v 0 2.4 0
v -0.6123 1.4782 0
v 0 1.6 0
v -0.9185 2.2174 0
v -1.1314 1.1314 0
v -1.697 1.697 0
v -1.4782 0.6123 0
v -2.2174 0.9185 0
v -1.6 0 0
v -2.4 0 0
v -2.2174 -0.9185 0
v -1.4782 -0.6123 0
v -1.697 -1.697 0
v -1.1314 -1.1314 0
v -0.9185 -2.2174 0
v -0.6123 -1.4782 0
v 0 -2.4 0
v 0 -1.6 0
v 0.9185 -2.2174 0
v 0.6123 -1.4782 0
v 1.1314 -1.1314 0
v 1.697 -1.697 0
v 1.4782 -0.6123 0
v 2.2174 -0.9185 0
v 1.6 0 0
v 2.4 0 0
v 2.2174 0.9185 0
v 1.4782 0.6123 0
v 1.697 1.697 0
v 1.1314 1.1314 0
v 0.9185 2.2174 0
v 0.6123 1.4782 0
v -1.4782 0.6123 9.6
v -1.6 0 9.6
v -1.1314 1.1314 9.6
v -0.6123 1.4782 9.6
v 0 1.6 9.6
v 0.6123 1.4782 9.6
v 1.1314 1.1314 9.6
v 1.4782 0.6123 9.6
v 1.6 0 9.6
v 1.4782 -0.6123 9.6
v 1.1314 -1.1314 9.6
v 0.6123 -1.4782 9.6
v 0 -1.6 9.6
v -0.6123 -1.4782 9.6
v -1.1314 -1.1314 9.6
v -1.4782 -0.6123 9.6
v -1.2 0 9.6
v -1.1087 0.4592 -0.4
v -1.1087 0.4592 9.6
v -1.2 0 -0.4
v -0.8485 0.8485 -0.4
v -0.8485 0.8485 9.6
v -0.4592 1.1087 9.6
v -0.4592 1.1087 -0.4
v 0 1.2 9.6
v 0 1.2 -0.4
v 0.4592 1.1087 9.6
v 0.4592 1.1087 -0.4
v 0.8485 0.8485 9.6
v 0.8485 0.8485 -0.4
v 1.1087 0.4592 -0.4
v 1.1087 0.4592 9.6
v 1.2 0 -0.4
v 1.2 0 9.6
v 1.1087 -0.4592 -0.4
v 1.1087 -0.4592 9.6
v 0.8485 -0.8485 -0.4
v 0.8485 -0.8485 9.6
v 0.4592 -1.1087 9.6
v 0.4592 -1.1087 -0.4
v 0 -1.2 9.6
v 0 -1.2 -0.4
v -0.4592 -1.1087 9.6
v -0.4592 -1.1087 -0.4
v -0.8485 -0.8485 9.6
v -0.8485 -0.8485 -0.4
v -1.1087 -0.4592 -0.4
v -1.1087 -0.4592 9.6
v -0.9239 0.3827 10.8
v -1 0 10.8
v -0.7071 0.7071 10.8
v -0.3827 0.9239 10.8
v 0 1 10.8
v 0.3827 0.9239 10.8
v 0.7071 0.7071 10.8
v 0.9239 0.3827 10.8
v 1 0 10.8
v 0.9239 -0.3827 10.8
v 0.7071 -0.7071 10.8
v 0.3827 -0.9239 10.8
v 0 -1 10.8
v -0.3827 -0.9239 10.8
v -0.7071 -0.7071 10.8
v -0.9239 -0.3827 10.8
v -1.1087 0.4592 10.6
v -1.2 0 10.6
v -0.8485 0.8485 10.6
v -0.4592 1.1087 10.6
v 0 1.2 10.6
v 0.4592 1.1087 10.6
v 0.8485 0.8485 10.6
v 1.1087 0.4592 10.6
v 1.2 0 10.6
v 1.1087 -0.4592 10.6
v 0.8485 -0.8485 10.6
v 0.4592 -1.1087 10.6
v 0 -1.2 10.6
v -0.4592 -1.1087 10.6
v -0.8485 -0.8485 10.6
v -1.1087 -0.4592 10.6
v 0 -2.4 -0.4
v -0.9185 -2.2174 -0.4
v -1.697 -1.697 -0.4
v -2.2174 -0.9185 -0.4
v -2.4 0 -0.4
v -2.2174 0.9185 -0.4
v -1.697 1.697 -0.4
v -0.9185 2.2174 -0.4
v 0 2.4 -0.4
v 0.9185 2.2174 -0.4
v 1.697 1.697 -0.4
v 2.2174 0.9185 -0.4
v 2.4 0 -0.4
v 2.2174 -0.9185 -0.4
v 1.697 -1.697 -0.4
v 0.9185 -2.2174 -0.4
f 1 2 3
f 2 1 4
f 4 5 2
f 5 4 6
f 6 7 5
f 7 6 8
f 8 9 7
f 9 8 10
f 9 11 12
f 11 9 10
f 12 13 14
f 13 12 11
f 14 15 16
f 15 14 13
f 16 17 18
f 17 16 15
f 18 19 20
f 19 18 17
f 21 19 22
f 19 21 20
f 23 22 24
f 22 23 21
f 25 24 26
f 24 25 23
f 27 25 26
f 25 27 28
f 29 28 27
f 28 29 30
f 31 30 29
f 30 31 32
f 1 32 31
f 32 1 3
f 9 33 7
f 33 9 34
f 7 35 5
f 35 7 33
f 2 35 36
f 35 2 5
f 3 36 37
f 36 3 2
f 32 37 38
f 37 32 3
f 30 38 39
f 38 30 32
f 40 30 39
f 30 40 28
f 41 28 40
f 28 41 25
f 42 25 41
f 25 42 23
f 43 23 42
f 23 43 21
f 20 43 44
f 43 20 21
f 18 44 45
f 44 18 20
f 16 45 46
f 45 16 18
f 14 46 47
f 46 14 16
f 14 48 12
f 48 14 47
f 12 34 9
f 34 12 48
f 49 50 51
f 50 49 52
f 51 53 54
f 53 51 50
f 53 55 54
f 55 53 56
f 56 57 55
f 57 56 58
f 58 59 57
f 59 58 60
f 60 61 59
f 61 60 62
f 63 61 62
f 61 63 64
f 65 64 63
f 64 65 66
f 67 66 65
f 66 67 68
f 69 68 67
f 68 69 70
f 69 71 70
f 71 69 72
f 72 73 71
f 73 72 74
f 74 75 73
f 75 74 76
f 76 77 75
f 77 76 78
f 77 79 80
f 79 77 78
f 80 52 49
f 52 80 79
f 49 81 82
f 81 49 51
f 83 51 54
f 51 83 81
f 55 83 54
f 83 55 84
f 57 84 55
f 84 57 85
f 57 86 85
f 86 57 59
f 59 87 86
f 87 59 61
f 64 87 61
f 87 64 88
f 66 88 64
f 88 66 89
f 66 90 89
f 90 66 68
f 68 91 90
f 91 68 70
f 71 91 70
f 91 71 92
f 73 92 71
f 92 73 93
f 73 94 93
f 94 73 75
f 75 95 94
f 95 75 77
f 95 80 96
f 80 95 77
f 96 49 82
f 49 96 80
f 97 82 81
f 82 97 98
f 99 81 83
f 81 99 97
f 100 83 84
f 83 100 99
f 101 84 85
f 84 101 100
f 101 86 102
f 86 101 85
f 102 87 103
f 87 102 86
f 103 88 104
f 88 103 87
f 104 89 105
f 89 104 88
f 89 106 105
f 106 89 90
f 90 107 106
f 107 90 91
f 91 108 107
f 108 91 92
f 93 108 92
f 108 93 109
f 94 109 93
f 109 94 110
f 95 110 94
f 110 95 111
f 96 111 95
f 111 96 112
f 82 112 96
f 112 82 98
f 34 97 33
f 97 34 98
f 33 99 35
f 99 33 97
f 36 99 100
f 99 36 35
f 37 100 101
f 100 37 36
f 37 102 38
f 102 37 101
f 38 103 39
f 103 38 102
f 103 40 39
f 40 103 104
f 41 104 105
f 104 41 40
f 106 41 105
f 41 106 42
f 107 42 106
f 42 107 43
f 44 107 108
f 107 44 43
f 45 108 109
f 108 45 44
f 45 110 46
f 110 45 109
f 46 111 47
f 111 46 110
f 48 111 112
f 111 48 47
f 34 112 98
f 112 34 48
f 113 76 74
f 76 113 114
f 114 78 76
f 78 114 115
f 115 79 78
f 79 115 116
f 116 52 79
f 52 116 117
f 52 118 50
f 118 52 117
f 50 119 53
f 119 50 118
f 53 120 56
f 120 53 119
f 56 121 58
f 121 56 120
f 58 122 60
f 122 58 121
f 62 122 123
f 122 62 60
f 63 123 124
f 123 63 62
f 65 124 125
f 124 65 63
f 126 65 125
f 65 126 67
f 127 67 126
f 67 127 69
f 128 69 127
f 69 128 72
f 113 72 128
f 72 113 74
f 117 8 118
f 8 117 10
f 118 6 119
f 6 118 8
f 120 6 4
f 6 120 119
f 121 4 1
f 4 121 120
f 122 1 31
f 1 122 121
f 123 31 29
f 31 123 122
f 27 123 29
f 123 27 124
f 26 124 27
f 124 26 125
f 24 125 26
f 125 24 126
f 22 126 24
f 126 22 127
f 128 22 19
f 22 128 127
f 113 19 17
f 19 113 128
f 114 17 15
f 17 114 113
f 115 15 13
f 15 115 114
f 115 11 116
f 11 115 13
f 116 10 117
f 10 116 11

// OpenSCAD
// file: ../p/4-4ring2.scad
use <../lib.scad>
function ldraw_lib__4_4ring2() = [
// 0 Ring  2 x 1.0
// 0 Name: 4-4ring2.dat
// 0 Author: James Jessiman
// 0 !LDRAW_ORG Primitive UPDATE 2009-01
// 0 !LICENSE Licensed under CC BY 2.0 and CC BY 4.0 : see CAreadme.txt
// 
// 0 BFC CERTIFY CCW
  [0,"BFC","CERTIFY"],
  [0,"BFC","CCW"],
// 
// 0 !HISTORY 1998-12-15 [PTadmin] Official Update 1998-10
// 0 !HISTORY 2002-04-05 [hafhead] Added BFC statement
// 0 !HISTORY 2002-04-25 [PTadmin] Official Update 2002-02
// 0 !HISTORY 2007-06-24 [PTadmin] Header formatted for Contributor Agreement
// 0 !HISTORY 2008-07-01 [PTadmin] Official Update 2008-01
// 0 !HISTORY 2008-08-26 [cwdee] Switch polygon winding and rename
// 0 !HISTORY 2009-05-02 [PTadmin] Official Update 2009-01
// 
// 
// 4 16 -1.1481 0 2.7717 -0.7654 0 1.8478 0 0 2 0 0 3
  [4,16,-1.1481,0,2.7717,-0.7654,0,1.8478,0,0,2,0,0,3],
// 4 16 -2.1213 0 2.1213 -1.4142 0 1.4142 -0.7654 0 1.8478 -1.1481 0 2.7717
  [4,16,-2.1213,0,2.1213,-1.4142,0,1.4142,-0.7654,0,1.8478,-1.1481,0,2.7717],
// 4 16 -2.7717 0 1.1481 -1.8478 0 0.7654 -1.4142 0 1.4142 -2.1213 0 2.1213
  [4,16,-2.7717,0,1.1481,-1.8478,0,0.7654,-1.4142,0,1.4142,-2.1213,0,2.1213],
// 4 16 -3 0 0 -2 0 0 -1.8478 0 0.7654 -2.7717 0 1.1481
  [4,16,-3,0,0,-2,0,0,-1.8478,0,0.7654,-2.7717,0,1.1481],
// 4 16 -2.7717 0 -1.1481 -1.8478 0 -0.7654 -2 0 0 -3 0 0
  [4,16,-2.7717,0,-1.1481,-1.8478,0,-0.7654,-2,0,0,-3,0,0],
// 4 16 -2.1213 0 -2.1213 -1.4142 0 -1.4142 -1.8478 0 -0.7654 -2.7717 0 -1.1481
  [4,16,-2.1213,0,-2.1213,-1.4142,0,-1.4142,-1.8478,0,-0.7654,-2.7717,0,-1.1481],
// 4 16 -1.1481 0 -2.7717 -0.7654 0 -1.8478 -1.4142 0 -1.4142 -2.1213 0 -2.1213
  [4,16,-1.1481,0,-2.7717,-0.7654,0,-1.8478,-1.4142,0,-1.4142,-2.1213,0,-2.1213],
// 4 16 0 0 -3 0 0 -2 -0.7654 0 -1.8478 -1.1481 0 -2.7717
  [4,16,0,0,-3,0,0,-2,-0.7654,0,-1.8478,-1.1481,0,-2.7717],
// 4 16 1.1481 0 -2.7717 0.7654 0 -1.8478 0 0 -2 0 0 -3
  [4,16,1.1481,0,-2.7717,0.7654,0,-1.8478,0,0,-2,0,0,-3],
// 4 16 2.1213 0 -2.1213 1.4142 0 -1.4142 0.7654 0 -1.8478 1.1481 0 -2.7717
  [4,16,2.1213,0,-2.1213,1.4142,0,-1.4142,0.7654,0,-1.8478,1.1481,0,-2.7717],
// 4 16 2.7717 0 -1.1481 1.8478 0 -0.7654 1.4142 0 -1.4142 2.1213 0 -2.1213
  [4,16,2.7717,0,-1.1481,1.8478,0,-0.7654,1.4142,0,-1.4142,2.1213,0,-2.1213],
// 4 16 3 0 0 2 0 0 1.8478 0 -0.7654 2.7717 0 -1.1481
  [4,16,3,0,0,2,0,0,1.8478,0,-0.7654,2.7717,0,-1.1481],
// 4 16 2.7717 0 1.1481 1.8478 0 0.7654 2 0 0 3 0 0
  [4,16,2.7717,0,1.1481,1.8478,0,0.7654,2,0,0,3,0,0],
// 4 16 2.1213 0 2.1213 1.4142 0 1.4142 1.8478 0 0.7654 2.7717 0 1.1481
  [4,16,2.1213,0,2.1213,1.4142,0,1.4142,1.8478,0,0.7654,2.7717,0,1.1481],
// 4 16 1.1481 0 2.7717 0.7654 0 1.8478 1.4142 0 1.4142 2.1213 0 2.1213
  [4,16,1.1481,0,2.7717,0.7654,0,1.8478,1.4142,0,1.4142,2.1213,0,2.1213],
// 4 16 0 0 3 0 0 2 0.7654 0 1.8478 1.1481 0 2.7717
  [4,16,0,0,3,0,0,2,0.7654,0,1.8478,1.1481,0,2.7717],
// 0
];
module ldraw_lib__4_4ring2(step=0, col=false, unit=2/5, alt=false, line=0.2, solid=!$preview)
    makepoly(ldraw_lib__4_4ring2(), step=step, col=col, unit=unit, alt=alt, line=line, solid=solid);
ldraw_lib__4_4ring2(line=0.2);
// file: ../p/4-4ring1.scad
use <../lib.scad>
function ldraw_lib__4_4ring1() = [
// 0 Ring  1 x 1.0
// 0 Name: 4-4ring1.dat
// 0 Author: James Jessiman
// 0 !LDRAW_ORG Primitive UPDATE 2009-01
// 0 !LICENSE Licensed under CC BY 2.0 and CC BY 4.0 : see CAreadme.txt
// 
// 0 BFC CERTIFY CCW
  [0,"BFC","CERTIFY"],
  [0,"BFC","CCW"],
// 
// 0 !HISTORY 1998-12-15 [PTadmin] Official Update 1998-10
// 0 !HISTORY 2002-04-08 [BrickCaster] Modified for BFC compliance
// 0 !HISTORY 2002-04-25 [PTadmin] Official Update 2002-02
// 0 !HISTORY 2007-06-24 [PTadmin] Header formatted for Contributor Agreement
// 0 !HISTORY 2008-07-01 [PTadmin] Official Update 2008-01
// 0 !HISTORY 2008-08-26 [cwdee] Switch polygon winding and rename
// 0 !HISTORY 2009-05-02 [PTadmin] Official Update 2009-01
// 
// 
// 4 16 -0.7654 0 1.8478 -0.3827 0 0.9239 0 0 1 0 0 2
  [4,16,-0.7654,0,1.8478,-0.3827,0,0.9239,0,0,1,0,0,2],
// 4 16 -1.4142 0 1.4142 -0.7071 0 0.7071 -0.3827 0 0.9239 -0.7654 0 1.8478
  [4,16,-1.4142,0,1.4142,-0.7071,0,0.7071,-0.3827,0,0.9239,-0.7654,0,1.8478],
// 4 16 -1.8478 0 0.7654 -0.9239 0 0.3827 -0.7071 0 0.7071 -1.4142 0 1.41420
  [4,16,-1.8478,0,0.7654,-0.9239,0,0.3827,-0.7071,0,0.7071,-1.4142,0,1.41420],
// 4 16 -2 0 0 -1 0 0 -0.9239 0 0.3827 -1.8478 0 0.7654
  [4,16,-2,0,0,-1,0,0,-0.9239,0,0.3827,-1.8478,0,0.7654],
// 4 16 -1.8478 0 -0.7654 -0.9239 0 -0.3827 -1 0 0 -2 0 0
  [4,16,-1.8478,0,-0.7654,-0.9239,0,-0.3827,-1,0,0,-2,0,0],
// 4 16 -1.4142 0 -1.4142 -0.7071 0 -0.7071 -0.9239 0 -0.3827 -1.8478 0 -0.7654
  [4,16,-1.4142,0,-1.4142,-0.7071,0,-0.7071,-0.9239,0,-0.3827,-1.8478,0,-0.7654],
// 4 16 -0.7654 0 -1.8478 -0.3827 0 -0.9239 -0.7071 0 -0.7071 -1.4142 0 -1.4142
  [4,16,-0.7654,0,-1.8478,-0.3827,0,-0.9239,-0.7071,0,-0.7071,-1.4142,0,-1.4142],
// 4 16 0 0 -2 0 0 -1 -0.3827 0 -0.9239 -0.7654 0 -1.8478
  [4,16,0,0,-2,0,0,-1,-0.3827,0,-0.9239,-0.7654,0,-1.8478],
// 4 16 0.7654 0 -1.8478 0.3827 0 -0.9239 0 0 -1 0 0 -2
  [4,16,0.7654,0,-1.8478,0.3827,0,-0.9239,0,0,-1,0,0,-2],
// 4 16 1.4142 0 -1.4142 0.7071 0 -0.7071 0.3827 0 -0.9239 0.7654 0 -1.8478
  [4,16,1.4142,0,-1.4142,0.7071,0,-0.7071,0.3827,0,-0.9239,0.7654,0,-1.8478],
// 4 16 1.8478 0 -0.7654 0.9239 0 -0.3827 0.7071 0 -0.7071 1.4142 0 -1.4142
  [4,16,1.8478,0,-0.7654,0.9239,0,-0.3827,0.7071,0,-0.7071,1.4142,0,-1.4142],
// 4 16 2 0 0 1 0 0 0.9239 0 -0.3827 1.8478 0 -0.7654
  [4,16,2,0,0,1,0,0,0.9239,0,-0.3827,1.8478,0,-0.7654],
// 4 16 1.8478 0 0.7654 0.9239 0 0.3827 1 0 0 2 0 0
  [4,16,1.8478,0,0.7654,0.9239,0,0.3827,1,0,0,2,0,0],
// 4 16 1.4142 0 1.4142 0.7071 0 0.7071 0.9239 0 0.3827 1.8478 0 0.7654
  [4,16,1.4142,0,1.4142,0.7071,0,0.7071,0.9239,0,0.3827,1.8478,0,0.7654],
// 4 16 0.7654 0 1.8478 0.3827 0 0.9239 0.7071 0 0.7071 1.4142 0 1.4142
  [4,16,0.7654,0,1.8478,0.3827,0,0.9239,0.7071,0,0.7071,1.4142,0,1.4142],
// 4 16 0 0 2 0 0 1 0.3827 0 0.9239 0.7654 0 1.8478
  [4,16,0,0,2,0,0,1,0.3827,0,0.9239,0.7654,0,1.8478],
// 0
];
module ldraw_lib__4_4ring1(step=0, col=false, unit=2/5, alt=false, line=0.2, solid=!$preview)
    makepoly(ldraw_lib__4_4ring1(), step=step, col=col, unit=unit, alt=alt, line=line, solid=solid);
ldraw_lib__4_4ring1(line=0.2);
// file: ../p/4-4edge.scad
use <../lib.scad>
function ldraw_lib__4_4edge() = [
// 0 Circle 1.0
// 0 Name: 4-4edge.dat
// 0 Author: James Jessiman
// 0 !LDRAW_ORG Primitive UPDATE 2017-01
// 0 !LICENSE Licensed under CC BY 4.0 : see CAreadme.txt
// 
// 0 BFC CERTIFY CCW
  [0,"BFC","CERTIFY"],
  [0,"BFC","CCW"],
// 
// 0 !HISTORY 1998-12-15 [PTadmin] Official Update 1998-10
// 0 !HISTORY 2005-12-28 [PTadmin] Official Update 2005-01
// 0 !HISTORY 2007-06-24 [PTadmin] Header formatted for Contributor Agreement
// 0 !HISTORY 2008-07-01 [PTadmin] Official Update 2008-01
// 0 !HISTORY 2017-01-15 [Steffen] BFCed
// 0 !HISTORY 2017-12-30 [PTadmin] Official Update 2017-01
// 
// 
// 2 24 1 0 0 0.9239 0 0.3827
  [2,24,1,0,0,0.9239,0,0.3827],
// 2 24 0.9239 0 0.3827 0.7071 0 0.7071
  [2,24,0.9239,0,0.3827,0.7071,0,0.7071],
// 2 24 0.7071 0 0.7071 0.3827 0 0.9239
  [2,24,0.7071,0,0.7071,0.3827,0,0.9239],
// 2 24 0.3827 0 0.9239 0 0 1
  [2,24,0.3827,0,0.9239,0,0,1],
// 2 24 0 0 1 -0.3827 0 0.9239
  [2,24,0,0,1,-0.3827,0,0.9239],
// 2 24 -0.3827 0 0.9239 -0.7071 0 0.7071
  [2,24,-0.3827,0,0.9239,-0.7071,0,0.7071],
// 2 24 -0.7071 0 0.7071 -0.9239 0 0.3827
  [2,24,-0.7071,0,0.7071,-0.9239,0,0.3827],
// 2 24 -0.9239 0 0.3827 -1 0 -0
  [2,24,-0.9239,0,0.3827,-1,0,-0],
// 2 24 -1 0 -0 -0.9239 0 -0.3827
  [2,24,-1,0,-0,-0.9239,0,-0.3827],
// 2 24 -0.9239 0 -0.3827 -0.7071 0 -0.7071
  [2,24,-0.9239,0,-0.3827,-0.7071,0,-0.7071],
// 2 24 -0.7071 0 -0.7071 -0.3827 0 -0.9239
  [2,24,-0.7071,0,-0.7071,-0.3827,0,-0.9239],
// 2 24 -0.3827 0 -0.9239 0 0 -1
  [2,24,-0.3827,0,-0.9239,0,0,-1],
// 2 24 0 0 -1 0.3827 0 -0.9239
  [2,24,0,0,-1,0.3827,0,-0.9239],
// 2 24 0.3827 0 -0.9239 0.7071 0 -0.7071
  [2,24,0.3827,0,-0.9239,0.7071,0,-0.7071],
// 2 24 0.7071 0 -0.7071 0.9239 0 -0.3827
  [2,24,0.7071,0,-0.7071,0.9239,0,-0.3827],
// 2 24 0.9239 0 -0.3827 1 0 0
  [2,24,0.9239,0,-0.3827,1,0,0],
];
module ldraw_lib__4_4edge(step=0, col=false, unit=2/5, alt=false, line=0.2, solid=!$preview)
    makepoly(ldraw_lib__4_4edge(), step=step, col=col, unit=unit, alt=alt, line=line, solid=solid);
ldraw_lib__4_4edge(line=0.2);
// file: ../p/4-4cyli.scad
use <../lib.scad>
function ldraw_lib__4_4cyli() = [
// 0 Cylinder 1.0
// 0 Name: 4-4cyli.dat
// 0 Author: James Jessiman
// 0 !LDRAW_ORG Primitive UPDATE 2005-01
// 0 !LICENSE Licensed under CC BY 2.0 and CC BY 4.0 : see CAreadme.txt
// 
// 0 BFC CERTIFY CCW
  [0,"BFC","CERTIFY"],
  [0,"BFC","CCW"],
// 
// 0 !HISTORY 1998-12-15 [PTadmin] Official Update 1998-10
// 0 !HISTORY 2002-03-23 [sbliss] Added BFC statement; merged headers from files in distributions LDraw 0.27 and Complete.
// 0 !HISTORY 2002-04-25 [PTadmin] Official Update 2002-02
// 0 !HISTORY 2004-12-14 [guyvivan] BFC CCW
// 0 !HISTORY 2005-12-28 [PTadmin] Official Update 2005-01
// 0 !HISTORY 2007-06-24 [PTadmin] Header formatted for Contributor Agreement
// 0 !HISTORY 2008-07-01 [PTadmin] Official Update 2008-01
// 
// 
// 4 16 1 1 0 0.9239 1 0.3827 0.9239 0 0.3827 1 0 0
  [4,16,1,1,0,0.9239,1,0.3827,0.9239,0,0.3827,1,0,0],
// 5 24 1 0 0 1 1 0 0.9239 0 0.3827 0.9239 0 -0.3827
  [5,24,1,0,0,1,1,0,0.9239,0,0.3827,0.9239,0,-0.3827],
// 4 16 0.9239 1 0.3827 0.7071 1 0.7071 0.7071 0 0.7071 0.9239 0 0.3827
  [4,16,0.9239,1,0.3827,0.7071,1,0.7071,0.7071,0,0.7071,0.9239,0,0.3827],
// 5 24 0.9239 0 0.3827 0.9239 1 0.3827 0.7071 0 0.7071 1 0 0
  [5,24,0.9239,0,0.3827,0.9239,1,0.3827,0.7071,0,0.7071,1,0,0],
// 4 16 0.7071 1 0.7071 0.3827 1 0.9239 0.3827 0 0.9239 0.7071 0 0.7071
  [4,16,0.7071,1,0.7071,0.3827,1,0.9239,0.3827,0,0.9239,0.7071,0,0.7071],
// 5 24 0.7071 0 0.7071 0.7071 1 0.7071 0.3827 0 0.9239 0.9239 0 0.3827
  [5,24,0.7071,0,0.7071,0.7071,1,0.7071,0.3827,0,0.9239,0.9239,0,0.3827],
// 4 16 0.3827 1 0.9239 0 1 1 0 0 1 0.3827 0 0.9239
  [4,16,0.3827,1,0.9239,0,1,1,0,0,1,0.3827,0,0.9239],
// 5 24 0.3827 0 0.9239 0.3827 1 0.9239 0 0 1 0.7071 0 0.7071
  [5,24,0.3827,0,0.9239,0.3827,1,0.9239,0,0,1,0.7071,0,0.7071],
// 4 16 0 1 1 -0.3827 1 0.9239 -0.3827 0 0.9239 0 0 1
  [4,16,0,1,1,-0.3827,1,0.9239,-0.3827,0,0.9239,0,0,1],
// 5 24 0 0 1 0 1 1 -0.3827 0 0.9239 0.3827 0 0.9239
  [5,24,0,0,1,0,1,1,-0.3827,0,0.9239,0.3827,0,0.9239],
// 4 16 -0.3827 1 0.9239 -0.7071 1 0.7071 -0.7071 0 0.7071 -0.3827 0 0.9239
  [4,16,-0.3827,1,0.9239,-0.7071,1,0.7071,-0.7071,0,0.7071,-0.3827,0,0.9239],
// 5 24 -0.3827 0 0.9239 -0.3827 1 0.9239 -0.7071 0 0.7071 0 0 1
  [5,24,-0.3827,0,0.9239,-0.3827,1,0.9239,-0.7071,0,0.7071,0,0,1],
// 4 16 -0.7071 1 0.7071 -0.9239 1 0.3827 -0.9239 0 0.3827 -0.7071 0 0.7071
  [4,16,-0.7071,1,0.7071,-0.9239,1,0.3827,-0.9239,0,0.3827,-0.7071,0,0.7071],
// 5 24 -0.7071 0 0.7071 -0.7071 1 0.7071 -0.9239 0 0.3827 -0.3827 0 0.9239
  [5,24,-0.7071,0,0.7071,-0.7071,1,0.7071,-0.9239,0,0.3827,-0.3827,0,0.9239],
// 4 16 -0.9239 1 0.3827 -1 1 0 -1 0 0 -0.9239 0 0.3827
  [4,16,-0.9239,1,0.3827,-1,1,0,-1,0,0,-0.9239,0,0.3827],
// 5 24 -0.9239 0 0.3827 -0.9239 1 0.3827 -1 0 0 -0.7071 0 0.7071
  [5,24,-0.9239,0,0.3827,-0.9239,1,0.3827,-1,0,0,-0.7071,0,0.7071],
// 4 16 -1 1 0 -0.9239 1 -0.3827 -0.9239 0 -0.3827 -1 0 0
  [4,16,-1,1,0,-0.9239,1,-0.3827,-0.9239,0,-0.3827,-1,0,0],
// 5 24 -1 0 0 -1 1 0 -0.9239 0 -0.3827 -0.9239 0 0.3827
  [5,24,-1,0,0,-1,1,0,-0.9239,0,-0.3827,-0.9239,0,0.3827],
// 4 16 -0.9239 1 -0.3827 -0.7071 1 -0.7071 -0.7071 0 -0.7071 -0.9239 0 -0.3827
  [4,16,-0.9239,1,-0.3827,-0.7071,1,-0.7071,-0.7071,0,-0.7071,-0.9239,0,-0.3827],
// 5 24 -0.9239 0 -0.3827 -0.9239 1 -0.3827 -0.7071 0 -0.7071 -1 0 0
  [5,24,-0.9239,0,-0.3827,-0.9239,1,-0.3827,-0.7071,0,-0.7071,-1,0,0],
// 4 16 -0.7071 1 -0.7071 -0.3827 1 -0.9239 -0.3827 0 -0.9239 -0.7071 0 -0.7071
  [4,16,-0.7071,1,-0.7071,-0.3827,1,-0.9239,-0.3827,0,-0.9239,-0.7071,0,-0.7071],
// 5 24 -0.7071 0 -0.7071 -0.7071 1 -0.7071 -0.3827 0 -0.9239 -0.9239 0 -0.3827
  [5,24,-0.7071,0,-0.7071,-0.7071,1,-0.7071,-0.3827,0,-0.9239,-0.9239,0,-0.3827],
// 4 16 -0.3827 1 -0.9239 0 1 -1 0 0 -1 -0.3827 0 -0.9239
  [4,16,-0.3827,1,-0.9239,0,1,-1,0,0,-1,-0.3827,0,-0.9239],
// 5 24 -0.3827 0 -0.9239 -0.3827 1 -0.9239 0 0 -1 -0.7071 0 -0.7071
  [5,24,-0.3827,0,-0.9239,-0.3827,1,-0.9239,0,0,-1,-0.7071,0,-0.7071],
// 4 16 0 1 -1 0.3827 1 -0.9239 0.3827 0 -0.9239 0 0 -1
  [4,16,0,1,-1,0.3827,1,-0.9239,0.3827,0,-0.9239,0,0,-1],
// 5 24 0 0 -1 0 1 -1 0.3827 0 -0.9239 -0.3827 0 -0.9239
  [5,24,0,0,-1,0,1,-1,0.3827,0,-0.9239,-0.3827,0,-0.9239],
// 4 16 0.3827 1 -0.9239 0.7071 1 -0.7071 0.7071 0 -0.7071 0.3827 0 -0.9239
  [4,16,0.3827,1,-0.9239,0.7071,1,-0.7071,0.7071,0,-0.7071,0.3827,0,-0.9239],
// 5 24 0.3827 0 -0.9239 0.3827 1 -0.9239 0.7071 0 -0.7071 0 0 -1
  [5,24,0.3827,0,-0.9239,0.3827,1,-0.9239,0.7071,0,-0.7071,0,0,-1],
// 4 16 0.7071 1 -0.7071 0.9239 1 -0.3827 0.9239 0 -0.3827 0.7071 0 -0.7071
  [4,16,0.7071,1,-0.7071,0.9239,1,-0.3827,0.9239,0,-0.3827,0.7071,0,-0.7071],
// 5 24 0.7071 0 -0.7071 0.7071 1 -0.7071 0.9239 0 -0.3827 0.3827 0 -0.9239
  [5,24,0.7071,0,-0.7071,0.7071,1,-0.7071,0.9239,0,-0.3827,0.3827,0,-0.9239],
// 4 16 0.9239 1 -0.3827 1 1 0 1 0 0 0.9239 0 -0.3827
  [4,16,0.9239,1,-0.3827,1,1,0,1,0,0,0.9239,0,-0.3827],
// 5 24 0.9239 0 -0.3827 0.9239 1 -0.3827 1 0 0 0.7071 0 -0.7071
  [5,24,0.9239,0,-0.3827,0.9239,1,-0.3827,1,0,0,0.7071,0,-0.7071],
// 0
];
module ldraw_lib__4_4cyli(step=0, col=false, unit=2/5, alt=false, line=0.2, solid=!$preview)
    makepoly(ldraw_lib__4_4cyli(), step=step, col=col, unit=unit, alt=alt, line=line, solid=solid);
ldraw_lib__4_4cyli(line=0.2);
// file: ../p/4-4con5.scad
use <../lib.scad>
function ldraw_lib__4_4con5() = [
// 0 Cone  5 x 1.0
// 0 Name: 4-4con5.dat
// 0 Author: Niels Karsdorp [nielsk]
// 0 !LDRAW_ORG Primitive UPDATE 2003-03
// 0 !LICENSE Licensed under CC BY 2.0 and CC BY 4.0 : see CAreadme.txt
// 
// 0 BFC CERTIFY CCW
  [0,"BFC","CERTIFY"],
  [0,"BFC","CCW"],
// 
// 0 !HISTORY 2003-12-19 [PTadmin] Official Update 2003-03
// 0 !HISTORY 2007-06-24 [PTadmin] Header formatted for Contributor Agreement
// 0 !HISTORY 2008-07-01 [PTadmin] Official Update 2008-01
// 
// 
// 5 24 5 1 0 6 0 0 4.6195 1 1.9135 4.6195 1 -1.9135
  [5,24,5,1,0,6,0,0,4.6195,1,1.9135,4.6195,1,-1.9135],
// 5 24 4.6195 1 1.9135 5.5434 0 2.2962 3.5355 1 3.5355 5 1 0
  [5,24,4.6195,1,1.9135,5.5434,0,2.2962,3.5355,1,3.5355,5,1,0],
// 5 24 3.5355 1 3.5355 4.2426 0 4.2426 1.9135 1 4.6195 4.6195 1 1.9135
  [5,24,3.5355,1,3.5355,4.2426,0,4.2426,1.9135,1,4.6195,4.6195,1,1.9135],
// 5 24 1.9135 1 4.6195 2.2962 0 5.5434 0 1 5 3.5355 1 3.5355
  [5,24,1.9135,1,4.6195,2.2962,0,5.5434,0,1,5,3.5355,1,3.5355],
// 5 24 0 1 5 0 0 6 -1.9135 1 4.6195 1.9135 1 4.6195
  [5,24,0,1,5,0,0,6,-1.9135,1,4.6195,1.9135,1,4.6195],
// 5 24 -1.9135 1 4.6195 -2.2962 0 5.5434 -3.5355 1 3.5355 0 1 5
  [5,24,-1.9135,1,4.6195,-2.2962,0,5.5434,-3.5355,1,3.5355,0,1,5],
// 5 24 -3.5355 1 3.5355 -4.2426 0 4.2426 -4.6195 1 1.9135 -1.9135 1 4.6195
  [5,24,-3.5355,1,3.5355,-4.2426,0,4.2426,-4.6195,1,1.9135,-1.9135,1,4.6195],
// 5 24 -4.6195 1 1.9135 -5.5434 0 2.2962 -5 1 0 -3.5355 1 3.5355
  [5,24,-4.6195,1,1.9135,-5.5434,0,2.2962,-5,1,0,-3.5355,1,3.5355],
// 5 24 -5 1 0 -6 0 0 -4.6195 1 -1.9135 -4.6195 1 1.9135
  [5,24,-5,1,0,-6,0,0,-4.6195,1,-1.9135,-4.6195,1,1.9135],
// 5 24 -4.6195 1 -1.9135 -5.5434 0 -2.2962 -3.5355 1 -3.5355 -5 1 0
  [5,24,-4.6195,1,-1.9135,-5.5434,0,-2.2962,-3.5355,1,-3.5355,-5,1,0],
// 5 24 -3.5355 1 -3.5355 -4.2426 0 -4.2426 -1.9135 1 -4.6195 -4.6195 1 -1.9135
  [5,24,-3.5355,1,-3.5355,-4.2426,0,-4.2426,-1.9135,1,-4.6195,-4.6195,1,-1.9135],
// 5 24 -1.9135 1 -4.6195 -2.2962 0 -5.5434 0 1 -5 -3.5355 1 -3.5355
  [5,24,-1.9135,1,-4.6195,-2.2962,0,-5.5434,0,1,-5,-3.5355,1,-3.5355],
// 5 24 0 1 -5 0 0 -6 1.9135 1 -4.6195 -1.9135 1 -4.6195
  [5,24,0,1,-5,0,0,-6,1.9135,1,-4.6195,-1.9135,1,-4.6195],
// 5 24 1.9135 1 -4.6195 2.2962 0 -5.5434 3.5355 1 -3.5355 0 1 -5
  [5,24,1.9135,1,-4.6195,2.2962,0,-5.5434,3.5355,1,-3.5355,0,1,-5],
// 5 24 3.5355 1 -3.5355 4.2426 0 -4.2426 4.6195 1 -1.9135 1.9135 1 -4.6195
  [5,24,3.5355,1,-3.5355,4.2426,0,-4.2426,4.6195,1,-1.9135,1.9135,1,-4.6195],
// 5 24 4.6195 1 -1.9135 5.5434 0 -2.2962 5 1 0 3.5355 1 -3.5355
  [5,24,4.6195,1,-1.9135,5.5434,0,-2.2962,5,1,0,3.5355,1,-3.5355],
// 
// 4 16 5 1 0 4.6195 1 1.9135 5.5434 0 2.2962 6 0 0
  [4,16,5,1,0,4.6195,1,1.9135,5.5434,0,2.2962,6,0,0],
// 4 16 4.6195 1 1.9135 3.5355 1 3.5355 4.2426 0 4.2426 5.5434 0 2.2962
  [4,16,4.6195,1,1.9135,3.5355,1,3.5355,4.2426,0,4.2426,5.5434,0,2.2962],
// 4 16 3.5355 1 3.5355 1.9135 1 4.6195 2.2962 0 5.5434 4.2426 0 4.2426
  [4,16,3.5355,1,3.5355,1.9135,1,4.6195,2.2962,0,5.5434,4.2426,0,4.2426],
// 4 16 1.9135 1 4.6195 0 1 5 0 0 6 2.2962 0 5.5434
  [4,16,1.9135,1,4.6195,0,1,5,0,0,6,2.2962,0,5.5434],
// 4 16 0 1 5 -1.9135 1 4.6195 -2.2962 0 5.5434 0 0 6
  [4,16,0,1,5,-1.9135,1,4.6195,-2.2962,0,5.5434,0,0,6],
// 4 16 -1.9135 1 4.6195 -3.5355 1 3.5355 -4.2426 0 4.2426 -2.2962 0 5.5434
  [4,16,-1.9135,1,4.6195,-3.5355,1,3.5355,-4.2426,0,4.2426,-2.2962,0,5.5434],
// 4 16 -3.5355 1 3.5355 -4.6195 1 1.9135 -5.5434 0 2.2962 -4.2426 0 4.2426
  [4,16,-3.5355,1,3.5355,-4.6195,1,1.9135,-5.5434,0,2.2962,-4.2426,0,4.2426],
// 4 16 -4.6195 1 1.9135 -5 1 0 -6 0 0 -5.5434 0 2.2962
  [4,16,-4.6195,1,1.9135,-5,1,0,-6,0,0,-5.5434,0,2.2962],
// 4 16 -5 1 0 -4.6195 1 -1.9135 -5.5434 0 -2.2962 -6 0 0
  [4,16,-5,1,0,-4.6195,1,-1.9135,-5.5434,0,-2.2962,-6,0,0],
// 4 16 -4.6195 1 -1.9135 -3.5355 1 -3.5355 -4.2426 0 -4.2426 -5.5434 0 -2.2962
  [4,16,-4.6195,1,-1.9135,-3.5355,1,-3.5355,-4.2426,0,-4.2426,-5.5434,0,-2.2962],
// 4 16 -3.5355 1 -3.5355 -1.9135 1 -4.6195 -2.2962 0 -5.5434 -4.2426 0 -4.2426
  [4,16,-3.5355,1,-3.5355,-1.9135,1,-4.6195,-2.2962,0,-5.5434,-4.2426,0,-4.2426],
// 4 16 -1.9135 1 -4.6195 0 1 -5 0 0 -6 -2.2962 0 -5.5434
  [4,16,-1.9135,1,-4.6195,0,1,-5,0,0,-6,-2.2962,0,-5.5434],
// 4 16 0 1 -5 1.9135 1 -4.6195 2.2962 0 -5.5434 0 0 -6
  [4,16,0,1,-5,1.9135,1,-4.6195,2.2962,0,-5.5434,0,0,-6],
// 4 16 1.9135 1 -4.6195 3.5355 1 -3.5355 4.2426 0 -4.2426 2.2962 0 -5.5434
  [4,16,1.9135,1,-4.6195,3.5355,1,-3.5355,4.2426,0,-4.2426,2.2962,0,-5.5434],
// 4 16 3.5355 1 -3.5355 4.6195 1 -1.9135 5.5434 0 -2.2962 4.2426 0 -4.2426
  [4,16,3.5355,1,-3.5355,4.6195,1,-1.9135,5.5434,0,-2.2962,4.2426,0,-4.2426],
// 4 16 4.6195 1 -1.9135 5 1 0 6 0 0 5.5434 0 -2.2962
  [4,16,4.6195,1,-1.9135,5,1,0,6,0,0,5.5434,0,-2.2962],
// 0
// 
];
module ldraw_lib__4_4con5(step=0, col=false, unit=2/5, alt=false, line=0.2, solid=!$preview)
    makepoly(ldraw_lib__4_4con5(), step=step, col=col, unit=unit, alt=alt, line=line, solid=solid);
ldraw_lib__4_4con5(line=0.2);
// file: ../p/4-4con3.scad
use <../lib.scad>
function ldraw_lib__4_4con3() = [
// 0 Cone  3 x 1.0
// 0 Name: 4-4con3.dat
// 0 Author: Niels Karsdorp [nielsk]
// 0 !LDRAW_ORG Primitive UPDATE 2003-02
// 0 !LICENSE Licensed under CC BY 2.0 and CC BY 4.0 : see CAreadme.txt
// 
// 0 BFC CERTIFY CCW
  [0,"BFC","CERTIFY"],
  [0,"BFC","CCW"],
// 
// 0 !HISTORY 2003-08-01 [PTadmin] Official Update 2003-02
// 0 !HISTORY 2007-06-24 [PTadmin] Header formatted for Contributor Agreement
// 0 !HISTORY 2008-07-01 [PTadmin] Official Update 2008-01
// 
// 
// 5 24 3 1 0 4 0 0 2.7717 1 1.1481 2.7717 1 -1.1481
  [5,24,3,1,0,4,0,0,2.7717,1,1.1481,2.7717,1,-1.1481],
// 5 24 2.7717 1 1.1481 3.6956 0 1.5308 2.1213 1 2.1213 3 1 0
  [5,24,2.7717,1,1.1481,3.6956,0,1.5308,2.1213,1,2.1213,3,1,0],
// 5 24 2.1213 1 2.1213 2.8284 0 2.8284 1.1481 1 2.7717 2.7717 1 1.1481
  [5,24,2.1213,1,2.1213,2.8284,0,2.8284,1.1481,1,2.7717,2.7717,1,1.1481],
// 5 24 1.1481 1 2.7717 1.5308 0 3.6956 0 1 3 2.1213 1 2.1213
  [5,24,1.1481,1,2.7717,1.5308,0,3.6956,0,1,3,2.1213,1,2.1213],
// 5 24 0 1 3 0 0 4 -1.1481 1 2.7717 1.1481 1 2.7717
  [5,24,0,1,3,0,0,4,-1.1481,1,2.7717,1.1481,1,2.7717],
// 5 24 -1.1481 1 2.7717 -1.5308 0 3.6956 -2.1213 1 2.1213 0 1 3
  [5,24,-1.1481,1,2.7717,-1.5308,0,3.6956,-2.1213,1,2.1213,0,1,3],
// 5 24 -2.1213 1 2.1213 -2.8284 0 2.8284 -2.7717 1 1.1481 -1.1481 1 2.7717
  [5,24,-2.1213,1,2.1213,-2.8284,0,2.8284,-2.7717,1,1.1481,-1.1481,1,2.7717],
// 5 24 -2.7717 1 1.1481 -3.6956 0 1.5308 -3 1 0 -2.1213 1 2.1213
  [5,24,-2.7717,1,1.1481,-3.6956,0,1.5308,-3,1,0,-2.1213,1,2.1213],
// 5 24 -3 1 0 -4 0 0 -2.7717 1 -1.1481 -2.7717 1 1.1481
  [5,24,-3,1,0,-4,0,0,-2.7717,1,-1.1481,-2.7717,1,1.1481],
// 5 24 -2.7717 1 -1.1481 -3.6956 0 -1.5308 -2.1213 1 -2.1213 -3 1 0
  [5,24,-2.7717,1,-1.1481,-3.6956,0,-1.5308,-2.1213,1,-2.1213,-3,1,0],
// 5 24 -2.1213 1 -2.1213 -2.8284 0 -2.8284 -1.1481 1 -2.7717 -2.7717 1 -1.1481
  [5,24,-2.1213,1,-2.1213,-2.8284,0,-2.8284,-1.1481,1,-2.7717,-2.7717,1,-1.1481],
// 5 24 -1.1481 1 -2.7717 -1.5308 0 -3.6956 0 1 -3 -2.1213 1 -2.1213
  [5,24,-1.1481,1,-2.7717,-1.5308,0,-3.6956,0,1,-3,-2.1213,1,-2.1213],
// 5 24 0 1 -3 0 0 -4 1.1481 1 -2.7717 -1.1481 1 -2.7717
  [5,24,0,1,-3,0,0,-4,1.1481,1,-2.7717,-1.1481,1,-2.7717],
// 5 24 1.1481 1 -2.7717 1.5308 0 -3.6956 2.1213 1 -2.1213 0 1 -3
  [5,24,1.1481,1,-2.7717,1.5308,0,-3.6956,2.1213,1,-2.1213,0,1,-3],
// 5 24 2.1213 1 -2.1213 2.8284 0 -2.8284 2.7717 1 -1.1481 1.1481 1 -2.7717
  [5,24,2.1213,1,-2.1213,2.8284,0,-2.8284,2.7717,1,-1.1481,1.1481,1,-2.7717],
// 5 24 2.7717 1 -1.1481 3.6956 0 -1.5308 3 1 0 2.1213 1 -2.1213
  [5,24,2.7717,1,-1.1481,3.6956,0,-1.5308,3,1,0,2.1213,1,-2.1213],
// 
// 4 16 3 1 0 2.7717 1 1.1481 3.6956 0 1.5308 4 0 0
  [4,16,3,1,0,2.7717,1,1.1481,3.6956,0,1.5308,4,0,0],
// 4 16 2.7717 1 1.1481 2.1213 1 2.1213 2.8284 0 2.8284 3.6956 0 1.5308
  [4,16,2.7717,1,1.1481,2.1213,1,2.1213,2.8284,0,2.8284,3.6956,0,1.5308],
// 4 16 2.1213 1 2.1213 1.1481 1 2.7717 1.5308 0 3.6956 2.8284 0 2.8284
  [4,16,2.1213,1,2.1213,1.1481,1,2.7717,1.5308,0,3.6956,2.8284,0,2.8284],
// 4 16 1.1481 1 2.7717 0 1 3 0 0 4 1.5308 0 3.6956
  [4,16,1.1481,1,2.7717,0,1,3,0,0,4,1.5308,0,3.6956],
// 4 16 0 1 3 -1.1481 1 2.7717 -1.5308 0 3.6956 0 0 4
  [4,16,0,1,3,-1.1481,1,2.7717,-1.5308,0,3.6956,0,0,4],
// 4 16 -1.1481 1 2.7717 -2.1213 1 2.1213 -2.8284 0 2.8284 -1.5308 0 3.6956
  [4,16,-1.1481,1,2.7717,-2.1213,1,2.1213,-2.8284,0,2.8284,-1.5308,0,3.6956],
// 4 16 -2.1213 1 2.1213 -2.7717 1 1.1481 -3.6956 0 1.5308 -2.8284 0 2.8284
  [4,16,-2.1213,1,2.1213,-2.7717,1,1.1481,-3.6956,0,1.5308,-2.8284,0,2.8284],
// 4 16 -2.7717 1 1.1481 -3 1 0 -4 0 0 -3.6956 0 1.5308
  [4,16,-2.7717,1,1.1481,-3,1,0,-4,0,0,-3.6956,0,1.5308],
// 4 16 -3 1 0 -2.7717 1 -1.1481 -3.6956 0 -1.5308 -4 0 0
  [4,16,-3,1,0,-2.7717,1,-1.1481,-3.6956,0,-1.5308,-4,0,0],
// 4 16 -2.7717 1 -1.1481 -2.1213 1 -2.1213 -2.8284 0 -2.8284 -3.6956 0 -1.5308
  [4,16,-2.7717,1,-1.1481,-2.1213,1,-2.1213,-2.8284,0,-2.8284,-3.6956,0,-1.5308],
// 4 16 -2.1213 1 -2.1213 -1.1481 1 -2.7717 -1.5308 0 -3.6956 -2.8284 0 -2.8284
  [4,16,-2.1213,1,-2.1213,-1.1481,1,-2.7717,-1.5308,0,-3.6956,-2.8284,0,-2.8284],
// 4 16 -1.1481 1 -2.7717 0 1 -3 0 0 -4 -1.5308 0 -3.6956
  [4,16,-1.1481,1,-2.7717,0,1,-3,0,0,-4,-1.5308,0,-3.6956],
// 4 16 0 1 -3 1.1481 1 -2.7717 1.5308 0 -3.6956 0 0 -4
  [4,16,0,1,-3,1.1481,1,-2.7717,1.5308,0,-3.6956,0,0,-4],
// 4 16 1.1481 1 -2.7717 2.1213 1 -2.1213 2.8284 0 -2.8284 1.5308 0 -3.6956
  [4,16,1.1481,1,-2.7717,2.1213,1,-2.1213,2.8284,0,-2.8284,1.5308,0,-3.6956],
// 4 16 2.1213 1 -2.1213 2.7717 1 -1.1481 3.6956 0 -1.5308 2.8284 0 -2.8284
  [4,16,2.1213,1,-2.1213,2.7717,1,-1.1481,3.6956,0,-1.5308,2.8284,0,-2.8284],
// 4 16 2.7717 1 -1.1481 3 1 0 4 0 0 3.6956 0 -1.5308
  [4,16,2.7717,1,-1.1481,3,1,0,4,0,0,3.6956,0,-1.5308],
// 
// 0
// 
];
module ldraw_lib__4_4con3(step=0, col=false, unit=2/5, alt=false, line=0.2, solid=!$preview)
    makepoly(ldraw_lib__4_4con3(), step=step, col=col, unit=unit, alt=alt, line=line, solid=solid);
ldraw_lib__4_4con3(line=0.2);
// main file
use <../lib.scad>
use <../p/4-4con3.scad>
use <../p/4-4con5.scad>
use <../p/4-4cyli.scad>
use <../p/4-4edge.scad>
use <../p/4-4ring1.scad>
use <../p/4-4ring2.scad>
function ldraw_lib__u9067() = [
// 0 ~Electric Train  4.5V On/Off Switch Brick  2 x  4 Pin
// 0 Name: u9067.dat
// 0 Author: Michael Heidemann [mikeheide]
// 0 !LDRAW_ORG Part UPDATE 2013-01
// 0 !LICENSE Licensed under CC BY 4.0 : see CAreadme.txt
// 
// 0 BFC CERTIFY CCW
  [0,"BFC","CERTIFY"],
  [0,"BFC","CCW"],
// 
// 0 !HISTORY 2013-07-21 [PTadmin] Official Update 2013-01
// 
// 
// 1 16 0 0 0 6 0 0 0 1 0 0 0 6 4-4edge.dat
  [1,16,0,0,0,6,0,0,0,1,0,0,0,6, ldraw_lib__4_4edge()],
// 1 16 0 0 0 2 0 0 0 1 0 0 0 2 4-4ring2.dat
  [1,16,0,0,0,2,0,0,0,1,0,0,0,2, ldraw_lib__4_4ring2()],
// 1 16 0 0 0 4 0 0 0 1 0 0 0 4 4-4edge.dat
  [1,16,0,0,0,4,0,0,0,1,0,0,0,4, ldraw_lib__4_4edge()],
// 1 16 0 0 0 -4 0 0 0 -24 0 0 0 4 4-4cyli.dat
  [1,16,0,0,0,-4,0,0,0,-24,0,0,0,4, ldraw_lib__4_4cyli()],
// 0 BFC INVERTNEXT
  [0,"BFC","INVERTNEXT"],
// 1 16 0 1 0 -3 0 0 0 -25 0 0 0 3 4-4cyli.dat
  [1,16,0,1,0,-3,0,0,0,-25,0,0,0,3, ldraw_lib__4_4cyli()],
// 0 BFC INVERTNEXT
  [0,"BFC","INVERTNEXT"],
// 1 16 0 -24 0 -0.5 0 0 0 -3 0 0 0 0.5 4-4con5.dat
  [1,16,0,-24,0,-0.5,0,0,0,-3,0,0,0,0.5, ldraw_lib__4_4con5()],
// 1 16 0 -26.5 0 -0.5 0 0 0 -0.5 0 0 0 0.5 4-4con5.dat
  [1,16,0,-26.5,0,-0.5,0,0,0,-0.5,0,0,0,0.5, ldraw_lib__4_4con5()],
// 1 16 0 -24 0 -1 0 0 0 -2.5 0 0 0 1 4-4con3.dat
  [1,16,0,-24,0,-1,0,0,0,-2.5,0,0,0,1, ldraw_lib__4_4con3()],
// 1 16 0 -24 0 4 0 0 0 1 0 0 0 4 4-4edge.dat
  [1,16,0,-24,0,4,0,0,0,1,0,0,0,4, ldraw_lib__4_4edge()],
// 1 16 0 -27 0 2.5 0 0 0 1 0 0 0 2.5 4-4edge.dat
  [1,16,0,-27,0,2.5,0,0,0,1,0,0,0,2.5, ldraw_lib__4_4edge()],
// 1 16 0 1 0 3 0 0 0 1 0 0 0 3 4-4edge.dat
  [1,16,0,1,0,3,0,0,0,1,0,0,0,3, ldraw_lib__4_4edge()],
// 1 16 0 1 0 6 0 0 0 1 0 0 0 6 4-4edge.dat
  [1,16,0,1,0,6,0,0,0,1,0,0,0,6, ldraw_lib__4_4edge()],
// 1 16 0 1 0 3 0 0 0 -1 0 0 0 -3 4-4ring1.dat
  [1,16,0,1,0,3,0,0,0,-1,0,0,0,-3, ldraw_lib__4_4ring1()],
// 1 16 0 1 0 -6 0 0 0 -1 0 0 0 6 4-4cyli.dat
  [1,16,0,1,0,-6,0,0,0,-1,0,0,0,6, ldraw_lib__4_4cyli()],
// 0 //
// 5 24 -2.7717 -24 1.1481 -3 -24 0 -2.7717 1 1.1481 -2.30975 -27 0.95675
  [5,24,-2.7717,-24,1.1481,-3,-24,0,-2.7717,1,1.1481,-2.30975,-27,0.95675],
// 5 24 -2.1213 -24 2.1213 -2.7717 -24 1.1481 -2.1213 1 2.1213 -1.76775 -27 1.76775
  [5,24,-2.1213,-24,2.1213,-2.7717,-24,1.1481,-2.1213,1,2.1213,-1.76775,-27,1.76775],
// 5 24 -1.1481 -24 2.7717 -2.1213 -24 2.1213 -1.1481 1 2.7717 -0.95675 -27 2.30975
  [5,24,-1.1481,-24,2.7717,-2.1213,-24,2.1213,-1.1481,1,2.7717,-0.95675,-27,2.30975],
// 5 24 0 -24 3 -1.1481 -24 2.7717 0 1 3 0 -27 2.5
  [5,24,0,-24,3,-1.1481,-24,2.7717,0,1,3,0,-27,2.5],
// 5 24 1.1481 -24 2.7717 0 -24 3 1.1481 1 2.7717 0.95675 -27 2.30975
  [5,24,1.1481,-24,2.7717,0,-24,3,1.1481,1,2.7717,0.95675,-27,2.30975],
// 5 24 2.1213 -24 2.1213 1.1481 -24 2.7717 2.1213 1 2.1213 1.76775 -27 1.76775
  [5,24,2.1213,-24,2.1213,1.1481,-24,2.7717,2.1213,1,2.1213,1.76775,-27,1.76775],
// 5 24 2.7717 -24 1.1481 2.1213 -24 2.1213 2.7717 1 1.1481 2.30975 -27 0.95675
  [5,24,2.7717,-24,1.1481,2.1213,-24,2.1213,2.7717,1,1.1481,2.30975,-27,0.95675],
// 5 24 3 -24 0 2.7717 -24 1.1481 3 1 0 2.5 -27 0
  [5,24,3,-24,0,2.7717,-24,1.1481,3,1,0,2.5,-27,0],
// 5 24 2.7717 -24 -1.1481 3 -24 0 2.7717 1 -1.1481 2.30975 -27 -0.95675
  [5,24,2.7717,-24,-1.1481,3,-24,0,2.7717,1,-1.1481,2.30975,-27,-0.95675],
// 5 24 2.1213 -24 -2.1213 2.7717 -24 -1.1481 2.1213 1 -2.1213 1.76775 -27 -1.76775
  [5,24,2.1213,-24,-2.1213,2.7717,-24,-1.1481,2.1213,1,-2.1213,1.76775,-27,-1.76775],
// 5 24 1.1481 -24 -2.7717 2.1213 -24 -2.1213 1.1481 1 -2.7717 0.95675 -27 -2.30975
  [5,24,1.1481,-24,-2.7717,2.1213,-24,-2.1213,1.1481,1,-2.7717,0.95675,-27,-2.30975],
// 5 24 0 -24 -3 1.1481 -24 -2.7717 0 1 -3 0 -27 -2.5
  [5,24,0,-24,-3,1.1481,-24,-2.7717,0,1,-3,0,-27,-2.5],
// 5 24 -1.1481 -24 -2.7717 0 -24 -3 -1.1481 1 -2.7717 -0.95675 -27 -2.30975
  [5,24,-1.1481,-24,-2.7717,0,-24,-3,-1.1481,1,-2.7717,-0.95675,-27,-2.30975],
// 5 24 -2.1213 -24 -2.1213 -1.1481 -24 -2.7717 -2.1213 1 -2.1213 -1.76775 -27 -1.76775
  [5,24,-2.1213,-24,-2.1213,-1.1481,-24,-2.7717,-2.1213,1,-2.1213,-1.76775,-27,-1.76775],
// 5 24 -2.7717 -24 -1.1481 -2.1213 -24 -2.1213 -2.7717 1 -1.1481 -2.30975 -27 -0.95675
  [5,24,-2.7717,-24,-1.1481,-2.1213,-24,-2.1213,-2.7717,1,-1.1481,-2.30975,-27,-0.95675],
// 5 24 -3 -24 0 -2.7717 -24 -1.1481 -3 1 0 -2.5 -27 0
  [5,24,-3,-24,0,-2.7717,-24,-1.1481,-3,1,0,-2.5,-27,0],
// 5 24 -2.7717 -26.5 1.1481 -3 -26.5 0 -2.5 -27 0 -3.6956 -24 1.5308
  [5,24,-2.7717,-26.5,1.1481,-3,-26.5,0,-2.5,-27,0,-3.6956,-24,1.5308],
// 5 24 -2.1213 -26.5 2.1213 -2.7717 -26.5 1.1481 -2.30975 -27 0.95675 -2.8284 -24 2.8284
  [5,24,-2.1213,-26.5,2.1213,-2.7717,-26.5,1.1481,-2.30975,-27,0.95675,-2.8284,-24,2.8284],
// 5 24 -1.1481 -26.5 2.7717 -2.1213 -26.5 2.1213 -1.76775 -27 1.76775 -1.5308 -24 3.6956
  [5,24,-1.1481,-26.5,2.7717,-2.1213,-26.5,2.1213,-1.76775,-27,1.76775,-1.5308,-24,3.6956],
// 5 24 0 -26.5 3 -1.1481 -26.5 2.7717 -0.95675 -27 2.30975 0 -24 4
  [5,24,0,-26.5,3,-1.1481,-26.5,2.7717,-0.95675,-27,2.30975,0,-24,4],
// 5 24 1.1481 -26.5 2.7717 0 -26.5 3 0 -27 2.5 1.5308 -24 3.6956
  [5,24,1.1481,-26.5,2.7717,0,-26.5,3,0,-27,2.5,1.5308,-24,3.6956],
// 5 24 2.1213 -26.5 2.1213 1.1481 -26.5 2.7717 0.95675 -27 2.30975 2.8284 -24 2.8284
  [5,24,2.1213,-26.5,2.1213,1.1481,-26.5,2.7717,0.95675,-27,2.30975,2.8284,-24,2.8284],
// 5 24 2.7717 -26.5 1.1481 2.1213 -26.5 2.1213 1.76775 -27 1.76775 3.6956 -24 1.5308
  [5,24,2.7717,-26.5,1.1481,2.1213,-26.5,2.1213,1.76775,-27,1.76775,3.6956,-24,1.5308],
// 5 24 3 -26.5 0 2.7717 -26.5 1.1481 2.30975 -27 0.95675 4 -24 0
  [5,24,3,-26.5,0,2.7717,-26.5,1.1481,2.30975,-27,0.95675,4,-24,0],
// 5 24 2.7717 -26.5 -1.1481 3 -26.5 0 2.5 -27 0 3.6956 -24 -1.5308
  [5,24,2.7717,-26.5,-1.1481,3,-26.5,0,2.5,-27,0,3.6956,-24,-1.5308],
// 5 24 2.1213 -26.5 -2.1213 2.7717 -26.5 -1.1481 2.30975 -27 -0.95675 2.8284 -24 -2.8284
  [5,24,2.1213,-26.5,-2.1213,2.7717,-26.5,-1.1481,2.30975,-27,-0.95675,2.8284,-24,-2.8284],
// 5 24 1.1481 -26.5 -2.7717 2.1213 -26.5 -2.1213 1.76775 -27 -1.76775 1.5308 -24 -3.6956
  [5,24,1.1481,-26.5,-2.7717,2.1213,-26.5,-2.1213,1.76775,-27,-1.76775,1.5308,-24,-3.6956],
// 5 24 0 -26.5 -3 1.1481 -26.5 -2.7717 0.95675 -27 -2.30975 0 -24 -4
  [5,24,0,-26.5,-3,1.1481,-26.5,-2.7717,0.95675,-27,-2.30975,0,-24,-4],
// 5 24 -1.1481 -26.5 -2.7717 0 -26.5 -3 0 -27 -2.5 -1.5308 -24 -3.6956
  [5,24,-1.1481,-26.5,-2.7717,0,-26.5,-3,0,-27,-2.5,-1.5308,-24,-3.6956],
// 5 24 -2.1213 -26.5 -2.1213 -1.1481 -26.5 -2.7717 -0.95675 -27 -2.30975 -2.8284 -24 -2.8284
  [5,24,-2.1213,-26.5,-2.1213,-1.1481,-26.5,-2.7717,-0.95675,-27,-2.30975,-2.8284,-24,-2.8284],
// 5 24 -2.7717 -26.5 -1.1481 -2.1213 -26.5 -2.1213 -1.76775 -27 -1.76775 -3.6956 -24 -1.5308
  [5,24,-2.7717,-26.5,-1.1481,-2.1213,-26.5,-2.1213,-1.76775,-27,-1.76775,-3.6956,-24,-1.5308],
// 5 24 -3 -26.5 0 -2.7717 -26.5 -1.1481 -2.30975 -27 -0.95675 -4 -24 0
  [5,24,-3,-26.5,0,-2.7717,-26.5,-1.1481,-2.30975,-27,-0.95675,-4,-24,0],
];
module ldraw_lib__u9067(step=0, col=false, unit=2/5, alt=false, line=0.2, solid=!$preview)
    makepoly(ldraw_lib__u9067(), step=step, col=col, unit=unit, alt=alt, line=line, solid=solid);
ldraw_lib__u9067(line=0.2);
